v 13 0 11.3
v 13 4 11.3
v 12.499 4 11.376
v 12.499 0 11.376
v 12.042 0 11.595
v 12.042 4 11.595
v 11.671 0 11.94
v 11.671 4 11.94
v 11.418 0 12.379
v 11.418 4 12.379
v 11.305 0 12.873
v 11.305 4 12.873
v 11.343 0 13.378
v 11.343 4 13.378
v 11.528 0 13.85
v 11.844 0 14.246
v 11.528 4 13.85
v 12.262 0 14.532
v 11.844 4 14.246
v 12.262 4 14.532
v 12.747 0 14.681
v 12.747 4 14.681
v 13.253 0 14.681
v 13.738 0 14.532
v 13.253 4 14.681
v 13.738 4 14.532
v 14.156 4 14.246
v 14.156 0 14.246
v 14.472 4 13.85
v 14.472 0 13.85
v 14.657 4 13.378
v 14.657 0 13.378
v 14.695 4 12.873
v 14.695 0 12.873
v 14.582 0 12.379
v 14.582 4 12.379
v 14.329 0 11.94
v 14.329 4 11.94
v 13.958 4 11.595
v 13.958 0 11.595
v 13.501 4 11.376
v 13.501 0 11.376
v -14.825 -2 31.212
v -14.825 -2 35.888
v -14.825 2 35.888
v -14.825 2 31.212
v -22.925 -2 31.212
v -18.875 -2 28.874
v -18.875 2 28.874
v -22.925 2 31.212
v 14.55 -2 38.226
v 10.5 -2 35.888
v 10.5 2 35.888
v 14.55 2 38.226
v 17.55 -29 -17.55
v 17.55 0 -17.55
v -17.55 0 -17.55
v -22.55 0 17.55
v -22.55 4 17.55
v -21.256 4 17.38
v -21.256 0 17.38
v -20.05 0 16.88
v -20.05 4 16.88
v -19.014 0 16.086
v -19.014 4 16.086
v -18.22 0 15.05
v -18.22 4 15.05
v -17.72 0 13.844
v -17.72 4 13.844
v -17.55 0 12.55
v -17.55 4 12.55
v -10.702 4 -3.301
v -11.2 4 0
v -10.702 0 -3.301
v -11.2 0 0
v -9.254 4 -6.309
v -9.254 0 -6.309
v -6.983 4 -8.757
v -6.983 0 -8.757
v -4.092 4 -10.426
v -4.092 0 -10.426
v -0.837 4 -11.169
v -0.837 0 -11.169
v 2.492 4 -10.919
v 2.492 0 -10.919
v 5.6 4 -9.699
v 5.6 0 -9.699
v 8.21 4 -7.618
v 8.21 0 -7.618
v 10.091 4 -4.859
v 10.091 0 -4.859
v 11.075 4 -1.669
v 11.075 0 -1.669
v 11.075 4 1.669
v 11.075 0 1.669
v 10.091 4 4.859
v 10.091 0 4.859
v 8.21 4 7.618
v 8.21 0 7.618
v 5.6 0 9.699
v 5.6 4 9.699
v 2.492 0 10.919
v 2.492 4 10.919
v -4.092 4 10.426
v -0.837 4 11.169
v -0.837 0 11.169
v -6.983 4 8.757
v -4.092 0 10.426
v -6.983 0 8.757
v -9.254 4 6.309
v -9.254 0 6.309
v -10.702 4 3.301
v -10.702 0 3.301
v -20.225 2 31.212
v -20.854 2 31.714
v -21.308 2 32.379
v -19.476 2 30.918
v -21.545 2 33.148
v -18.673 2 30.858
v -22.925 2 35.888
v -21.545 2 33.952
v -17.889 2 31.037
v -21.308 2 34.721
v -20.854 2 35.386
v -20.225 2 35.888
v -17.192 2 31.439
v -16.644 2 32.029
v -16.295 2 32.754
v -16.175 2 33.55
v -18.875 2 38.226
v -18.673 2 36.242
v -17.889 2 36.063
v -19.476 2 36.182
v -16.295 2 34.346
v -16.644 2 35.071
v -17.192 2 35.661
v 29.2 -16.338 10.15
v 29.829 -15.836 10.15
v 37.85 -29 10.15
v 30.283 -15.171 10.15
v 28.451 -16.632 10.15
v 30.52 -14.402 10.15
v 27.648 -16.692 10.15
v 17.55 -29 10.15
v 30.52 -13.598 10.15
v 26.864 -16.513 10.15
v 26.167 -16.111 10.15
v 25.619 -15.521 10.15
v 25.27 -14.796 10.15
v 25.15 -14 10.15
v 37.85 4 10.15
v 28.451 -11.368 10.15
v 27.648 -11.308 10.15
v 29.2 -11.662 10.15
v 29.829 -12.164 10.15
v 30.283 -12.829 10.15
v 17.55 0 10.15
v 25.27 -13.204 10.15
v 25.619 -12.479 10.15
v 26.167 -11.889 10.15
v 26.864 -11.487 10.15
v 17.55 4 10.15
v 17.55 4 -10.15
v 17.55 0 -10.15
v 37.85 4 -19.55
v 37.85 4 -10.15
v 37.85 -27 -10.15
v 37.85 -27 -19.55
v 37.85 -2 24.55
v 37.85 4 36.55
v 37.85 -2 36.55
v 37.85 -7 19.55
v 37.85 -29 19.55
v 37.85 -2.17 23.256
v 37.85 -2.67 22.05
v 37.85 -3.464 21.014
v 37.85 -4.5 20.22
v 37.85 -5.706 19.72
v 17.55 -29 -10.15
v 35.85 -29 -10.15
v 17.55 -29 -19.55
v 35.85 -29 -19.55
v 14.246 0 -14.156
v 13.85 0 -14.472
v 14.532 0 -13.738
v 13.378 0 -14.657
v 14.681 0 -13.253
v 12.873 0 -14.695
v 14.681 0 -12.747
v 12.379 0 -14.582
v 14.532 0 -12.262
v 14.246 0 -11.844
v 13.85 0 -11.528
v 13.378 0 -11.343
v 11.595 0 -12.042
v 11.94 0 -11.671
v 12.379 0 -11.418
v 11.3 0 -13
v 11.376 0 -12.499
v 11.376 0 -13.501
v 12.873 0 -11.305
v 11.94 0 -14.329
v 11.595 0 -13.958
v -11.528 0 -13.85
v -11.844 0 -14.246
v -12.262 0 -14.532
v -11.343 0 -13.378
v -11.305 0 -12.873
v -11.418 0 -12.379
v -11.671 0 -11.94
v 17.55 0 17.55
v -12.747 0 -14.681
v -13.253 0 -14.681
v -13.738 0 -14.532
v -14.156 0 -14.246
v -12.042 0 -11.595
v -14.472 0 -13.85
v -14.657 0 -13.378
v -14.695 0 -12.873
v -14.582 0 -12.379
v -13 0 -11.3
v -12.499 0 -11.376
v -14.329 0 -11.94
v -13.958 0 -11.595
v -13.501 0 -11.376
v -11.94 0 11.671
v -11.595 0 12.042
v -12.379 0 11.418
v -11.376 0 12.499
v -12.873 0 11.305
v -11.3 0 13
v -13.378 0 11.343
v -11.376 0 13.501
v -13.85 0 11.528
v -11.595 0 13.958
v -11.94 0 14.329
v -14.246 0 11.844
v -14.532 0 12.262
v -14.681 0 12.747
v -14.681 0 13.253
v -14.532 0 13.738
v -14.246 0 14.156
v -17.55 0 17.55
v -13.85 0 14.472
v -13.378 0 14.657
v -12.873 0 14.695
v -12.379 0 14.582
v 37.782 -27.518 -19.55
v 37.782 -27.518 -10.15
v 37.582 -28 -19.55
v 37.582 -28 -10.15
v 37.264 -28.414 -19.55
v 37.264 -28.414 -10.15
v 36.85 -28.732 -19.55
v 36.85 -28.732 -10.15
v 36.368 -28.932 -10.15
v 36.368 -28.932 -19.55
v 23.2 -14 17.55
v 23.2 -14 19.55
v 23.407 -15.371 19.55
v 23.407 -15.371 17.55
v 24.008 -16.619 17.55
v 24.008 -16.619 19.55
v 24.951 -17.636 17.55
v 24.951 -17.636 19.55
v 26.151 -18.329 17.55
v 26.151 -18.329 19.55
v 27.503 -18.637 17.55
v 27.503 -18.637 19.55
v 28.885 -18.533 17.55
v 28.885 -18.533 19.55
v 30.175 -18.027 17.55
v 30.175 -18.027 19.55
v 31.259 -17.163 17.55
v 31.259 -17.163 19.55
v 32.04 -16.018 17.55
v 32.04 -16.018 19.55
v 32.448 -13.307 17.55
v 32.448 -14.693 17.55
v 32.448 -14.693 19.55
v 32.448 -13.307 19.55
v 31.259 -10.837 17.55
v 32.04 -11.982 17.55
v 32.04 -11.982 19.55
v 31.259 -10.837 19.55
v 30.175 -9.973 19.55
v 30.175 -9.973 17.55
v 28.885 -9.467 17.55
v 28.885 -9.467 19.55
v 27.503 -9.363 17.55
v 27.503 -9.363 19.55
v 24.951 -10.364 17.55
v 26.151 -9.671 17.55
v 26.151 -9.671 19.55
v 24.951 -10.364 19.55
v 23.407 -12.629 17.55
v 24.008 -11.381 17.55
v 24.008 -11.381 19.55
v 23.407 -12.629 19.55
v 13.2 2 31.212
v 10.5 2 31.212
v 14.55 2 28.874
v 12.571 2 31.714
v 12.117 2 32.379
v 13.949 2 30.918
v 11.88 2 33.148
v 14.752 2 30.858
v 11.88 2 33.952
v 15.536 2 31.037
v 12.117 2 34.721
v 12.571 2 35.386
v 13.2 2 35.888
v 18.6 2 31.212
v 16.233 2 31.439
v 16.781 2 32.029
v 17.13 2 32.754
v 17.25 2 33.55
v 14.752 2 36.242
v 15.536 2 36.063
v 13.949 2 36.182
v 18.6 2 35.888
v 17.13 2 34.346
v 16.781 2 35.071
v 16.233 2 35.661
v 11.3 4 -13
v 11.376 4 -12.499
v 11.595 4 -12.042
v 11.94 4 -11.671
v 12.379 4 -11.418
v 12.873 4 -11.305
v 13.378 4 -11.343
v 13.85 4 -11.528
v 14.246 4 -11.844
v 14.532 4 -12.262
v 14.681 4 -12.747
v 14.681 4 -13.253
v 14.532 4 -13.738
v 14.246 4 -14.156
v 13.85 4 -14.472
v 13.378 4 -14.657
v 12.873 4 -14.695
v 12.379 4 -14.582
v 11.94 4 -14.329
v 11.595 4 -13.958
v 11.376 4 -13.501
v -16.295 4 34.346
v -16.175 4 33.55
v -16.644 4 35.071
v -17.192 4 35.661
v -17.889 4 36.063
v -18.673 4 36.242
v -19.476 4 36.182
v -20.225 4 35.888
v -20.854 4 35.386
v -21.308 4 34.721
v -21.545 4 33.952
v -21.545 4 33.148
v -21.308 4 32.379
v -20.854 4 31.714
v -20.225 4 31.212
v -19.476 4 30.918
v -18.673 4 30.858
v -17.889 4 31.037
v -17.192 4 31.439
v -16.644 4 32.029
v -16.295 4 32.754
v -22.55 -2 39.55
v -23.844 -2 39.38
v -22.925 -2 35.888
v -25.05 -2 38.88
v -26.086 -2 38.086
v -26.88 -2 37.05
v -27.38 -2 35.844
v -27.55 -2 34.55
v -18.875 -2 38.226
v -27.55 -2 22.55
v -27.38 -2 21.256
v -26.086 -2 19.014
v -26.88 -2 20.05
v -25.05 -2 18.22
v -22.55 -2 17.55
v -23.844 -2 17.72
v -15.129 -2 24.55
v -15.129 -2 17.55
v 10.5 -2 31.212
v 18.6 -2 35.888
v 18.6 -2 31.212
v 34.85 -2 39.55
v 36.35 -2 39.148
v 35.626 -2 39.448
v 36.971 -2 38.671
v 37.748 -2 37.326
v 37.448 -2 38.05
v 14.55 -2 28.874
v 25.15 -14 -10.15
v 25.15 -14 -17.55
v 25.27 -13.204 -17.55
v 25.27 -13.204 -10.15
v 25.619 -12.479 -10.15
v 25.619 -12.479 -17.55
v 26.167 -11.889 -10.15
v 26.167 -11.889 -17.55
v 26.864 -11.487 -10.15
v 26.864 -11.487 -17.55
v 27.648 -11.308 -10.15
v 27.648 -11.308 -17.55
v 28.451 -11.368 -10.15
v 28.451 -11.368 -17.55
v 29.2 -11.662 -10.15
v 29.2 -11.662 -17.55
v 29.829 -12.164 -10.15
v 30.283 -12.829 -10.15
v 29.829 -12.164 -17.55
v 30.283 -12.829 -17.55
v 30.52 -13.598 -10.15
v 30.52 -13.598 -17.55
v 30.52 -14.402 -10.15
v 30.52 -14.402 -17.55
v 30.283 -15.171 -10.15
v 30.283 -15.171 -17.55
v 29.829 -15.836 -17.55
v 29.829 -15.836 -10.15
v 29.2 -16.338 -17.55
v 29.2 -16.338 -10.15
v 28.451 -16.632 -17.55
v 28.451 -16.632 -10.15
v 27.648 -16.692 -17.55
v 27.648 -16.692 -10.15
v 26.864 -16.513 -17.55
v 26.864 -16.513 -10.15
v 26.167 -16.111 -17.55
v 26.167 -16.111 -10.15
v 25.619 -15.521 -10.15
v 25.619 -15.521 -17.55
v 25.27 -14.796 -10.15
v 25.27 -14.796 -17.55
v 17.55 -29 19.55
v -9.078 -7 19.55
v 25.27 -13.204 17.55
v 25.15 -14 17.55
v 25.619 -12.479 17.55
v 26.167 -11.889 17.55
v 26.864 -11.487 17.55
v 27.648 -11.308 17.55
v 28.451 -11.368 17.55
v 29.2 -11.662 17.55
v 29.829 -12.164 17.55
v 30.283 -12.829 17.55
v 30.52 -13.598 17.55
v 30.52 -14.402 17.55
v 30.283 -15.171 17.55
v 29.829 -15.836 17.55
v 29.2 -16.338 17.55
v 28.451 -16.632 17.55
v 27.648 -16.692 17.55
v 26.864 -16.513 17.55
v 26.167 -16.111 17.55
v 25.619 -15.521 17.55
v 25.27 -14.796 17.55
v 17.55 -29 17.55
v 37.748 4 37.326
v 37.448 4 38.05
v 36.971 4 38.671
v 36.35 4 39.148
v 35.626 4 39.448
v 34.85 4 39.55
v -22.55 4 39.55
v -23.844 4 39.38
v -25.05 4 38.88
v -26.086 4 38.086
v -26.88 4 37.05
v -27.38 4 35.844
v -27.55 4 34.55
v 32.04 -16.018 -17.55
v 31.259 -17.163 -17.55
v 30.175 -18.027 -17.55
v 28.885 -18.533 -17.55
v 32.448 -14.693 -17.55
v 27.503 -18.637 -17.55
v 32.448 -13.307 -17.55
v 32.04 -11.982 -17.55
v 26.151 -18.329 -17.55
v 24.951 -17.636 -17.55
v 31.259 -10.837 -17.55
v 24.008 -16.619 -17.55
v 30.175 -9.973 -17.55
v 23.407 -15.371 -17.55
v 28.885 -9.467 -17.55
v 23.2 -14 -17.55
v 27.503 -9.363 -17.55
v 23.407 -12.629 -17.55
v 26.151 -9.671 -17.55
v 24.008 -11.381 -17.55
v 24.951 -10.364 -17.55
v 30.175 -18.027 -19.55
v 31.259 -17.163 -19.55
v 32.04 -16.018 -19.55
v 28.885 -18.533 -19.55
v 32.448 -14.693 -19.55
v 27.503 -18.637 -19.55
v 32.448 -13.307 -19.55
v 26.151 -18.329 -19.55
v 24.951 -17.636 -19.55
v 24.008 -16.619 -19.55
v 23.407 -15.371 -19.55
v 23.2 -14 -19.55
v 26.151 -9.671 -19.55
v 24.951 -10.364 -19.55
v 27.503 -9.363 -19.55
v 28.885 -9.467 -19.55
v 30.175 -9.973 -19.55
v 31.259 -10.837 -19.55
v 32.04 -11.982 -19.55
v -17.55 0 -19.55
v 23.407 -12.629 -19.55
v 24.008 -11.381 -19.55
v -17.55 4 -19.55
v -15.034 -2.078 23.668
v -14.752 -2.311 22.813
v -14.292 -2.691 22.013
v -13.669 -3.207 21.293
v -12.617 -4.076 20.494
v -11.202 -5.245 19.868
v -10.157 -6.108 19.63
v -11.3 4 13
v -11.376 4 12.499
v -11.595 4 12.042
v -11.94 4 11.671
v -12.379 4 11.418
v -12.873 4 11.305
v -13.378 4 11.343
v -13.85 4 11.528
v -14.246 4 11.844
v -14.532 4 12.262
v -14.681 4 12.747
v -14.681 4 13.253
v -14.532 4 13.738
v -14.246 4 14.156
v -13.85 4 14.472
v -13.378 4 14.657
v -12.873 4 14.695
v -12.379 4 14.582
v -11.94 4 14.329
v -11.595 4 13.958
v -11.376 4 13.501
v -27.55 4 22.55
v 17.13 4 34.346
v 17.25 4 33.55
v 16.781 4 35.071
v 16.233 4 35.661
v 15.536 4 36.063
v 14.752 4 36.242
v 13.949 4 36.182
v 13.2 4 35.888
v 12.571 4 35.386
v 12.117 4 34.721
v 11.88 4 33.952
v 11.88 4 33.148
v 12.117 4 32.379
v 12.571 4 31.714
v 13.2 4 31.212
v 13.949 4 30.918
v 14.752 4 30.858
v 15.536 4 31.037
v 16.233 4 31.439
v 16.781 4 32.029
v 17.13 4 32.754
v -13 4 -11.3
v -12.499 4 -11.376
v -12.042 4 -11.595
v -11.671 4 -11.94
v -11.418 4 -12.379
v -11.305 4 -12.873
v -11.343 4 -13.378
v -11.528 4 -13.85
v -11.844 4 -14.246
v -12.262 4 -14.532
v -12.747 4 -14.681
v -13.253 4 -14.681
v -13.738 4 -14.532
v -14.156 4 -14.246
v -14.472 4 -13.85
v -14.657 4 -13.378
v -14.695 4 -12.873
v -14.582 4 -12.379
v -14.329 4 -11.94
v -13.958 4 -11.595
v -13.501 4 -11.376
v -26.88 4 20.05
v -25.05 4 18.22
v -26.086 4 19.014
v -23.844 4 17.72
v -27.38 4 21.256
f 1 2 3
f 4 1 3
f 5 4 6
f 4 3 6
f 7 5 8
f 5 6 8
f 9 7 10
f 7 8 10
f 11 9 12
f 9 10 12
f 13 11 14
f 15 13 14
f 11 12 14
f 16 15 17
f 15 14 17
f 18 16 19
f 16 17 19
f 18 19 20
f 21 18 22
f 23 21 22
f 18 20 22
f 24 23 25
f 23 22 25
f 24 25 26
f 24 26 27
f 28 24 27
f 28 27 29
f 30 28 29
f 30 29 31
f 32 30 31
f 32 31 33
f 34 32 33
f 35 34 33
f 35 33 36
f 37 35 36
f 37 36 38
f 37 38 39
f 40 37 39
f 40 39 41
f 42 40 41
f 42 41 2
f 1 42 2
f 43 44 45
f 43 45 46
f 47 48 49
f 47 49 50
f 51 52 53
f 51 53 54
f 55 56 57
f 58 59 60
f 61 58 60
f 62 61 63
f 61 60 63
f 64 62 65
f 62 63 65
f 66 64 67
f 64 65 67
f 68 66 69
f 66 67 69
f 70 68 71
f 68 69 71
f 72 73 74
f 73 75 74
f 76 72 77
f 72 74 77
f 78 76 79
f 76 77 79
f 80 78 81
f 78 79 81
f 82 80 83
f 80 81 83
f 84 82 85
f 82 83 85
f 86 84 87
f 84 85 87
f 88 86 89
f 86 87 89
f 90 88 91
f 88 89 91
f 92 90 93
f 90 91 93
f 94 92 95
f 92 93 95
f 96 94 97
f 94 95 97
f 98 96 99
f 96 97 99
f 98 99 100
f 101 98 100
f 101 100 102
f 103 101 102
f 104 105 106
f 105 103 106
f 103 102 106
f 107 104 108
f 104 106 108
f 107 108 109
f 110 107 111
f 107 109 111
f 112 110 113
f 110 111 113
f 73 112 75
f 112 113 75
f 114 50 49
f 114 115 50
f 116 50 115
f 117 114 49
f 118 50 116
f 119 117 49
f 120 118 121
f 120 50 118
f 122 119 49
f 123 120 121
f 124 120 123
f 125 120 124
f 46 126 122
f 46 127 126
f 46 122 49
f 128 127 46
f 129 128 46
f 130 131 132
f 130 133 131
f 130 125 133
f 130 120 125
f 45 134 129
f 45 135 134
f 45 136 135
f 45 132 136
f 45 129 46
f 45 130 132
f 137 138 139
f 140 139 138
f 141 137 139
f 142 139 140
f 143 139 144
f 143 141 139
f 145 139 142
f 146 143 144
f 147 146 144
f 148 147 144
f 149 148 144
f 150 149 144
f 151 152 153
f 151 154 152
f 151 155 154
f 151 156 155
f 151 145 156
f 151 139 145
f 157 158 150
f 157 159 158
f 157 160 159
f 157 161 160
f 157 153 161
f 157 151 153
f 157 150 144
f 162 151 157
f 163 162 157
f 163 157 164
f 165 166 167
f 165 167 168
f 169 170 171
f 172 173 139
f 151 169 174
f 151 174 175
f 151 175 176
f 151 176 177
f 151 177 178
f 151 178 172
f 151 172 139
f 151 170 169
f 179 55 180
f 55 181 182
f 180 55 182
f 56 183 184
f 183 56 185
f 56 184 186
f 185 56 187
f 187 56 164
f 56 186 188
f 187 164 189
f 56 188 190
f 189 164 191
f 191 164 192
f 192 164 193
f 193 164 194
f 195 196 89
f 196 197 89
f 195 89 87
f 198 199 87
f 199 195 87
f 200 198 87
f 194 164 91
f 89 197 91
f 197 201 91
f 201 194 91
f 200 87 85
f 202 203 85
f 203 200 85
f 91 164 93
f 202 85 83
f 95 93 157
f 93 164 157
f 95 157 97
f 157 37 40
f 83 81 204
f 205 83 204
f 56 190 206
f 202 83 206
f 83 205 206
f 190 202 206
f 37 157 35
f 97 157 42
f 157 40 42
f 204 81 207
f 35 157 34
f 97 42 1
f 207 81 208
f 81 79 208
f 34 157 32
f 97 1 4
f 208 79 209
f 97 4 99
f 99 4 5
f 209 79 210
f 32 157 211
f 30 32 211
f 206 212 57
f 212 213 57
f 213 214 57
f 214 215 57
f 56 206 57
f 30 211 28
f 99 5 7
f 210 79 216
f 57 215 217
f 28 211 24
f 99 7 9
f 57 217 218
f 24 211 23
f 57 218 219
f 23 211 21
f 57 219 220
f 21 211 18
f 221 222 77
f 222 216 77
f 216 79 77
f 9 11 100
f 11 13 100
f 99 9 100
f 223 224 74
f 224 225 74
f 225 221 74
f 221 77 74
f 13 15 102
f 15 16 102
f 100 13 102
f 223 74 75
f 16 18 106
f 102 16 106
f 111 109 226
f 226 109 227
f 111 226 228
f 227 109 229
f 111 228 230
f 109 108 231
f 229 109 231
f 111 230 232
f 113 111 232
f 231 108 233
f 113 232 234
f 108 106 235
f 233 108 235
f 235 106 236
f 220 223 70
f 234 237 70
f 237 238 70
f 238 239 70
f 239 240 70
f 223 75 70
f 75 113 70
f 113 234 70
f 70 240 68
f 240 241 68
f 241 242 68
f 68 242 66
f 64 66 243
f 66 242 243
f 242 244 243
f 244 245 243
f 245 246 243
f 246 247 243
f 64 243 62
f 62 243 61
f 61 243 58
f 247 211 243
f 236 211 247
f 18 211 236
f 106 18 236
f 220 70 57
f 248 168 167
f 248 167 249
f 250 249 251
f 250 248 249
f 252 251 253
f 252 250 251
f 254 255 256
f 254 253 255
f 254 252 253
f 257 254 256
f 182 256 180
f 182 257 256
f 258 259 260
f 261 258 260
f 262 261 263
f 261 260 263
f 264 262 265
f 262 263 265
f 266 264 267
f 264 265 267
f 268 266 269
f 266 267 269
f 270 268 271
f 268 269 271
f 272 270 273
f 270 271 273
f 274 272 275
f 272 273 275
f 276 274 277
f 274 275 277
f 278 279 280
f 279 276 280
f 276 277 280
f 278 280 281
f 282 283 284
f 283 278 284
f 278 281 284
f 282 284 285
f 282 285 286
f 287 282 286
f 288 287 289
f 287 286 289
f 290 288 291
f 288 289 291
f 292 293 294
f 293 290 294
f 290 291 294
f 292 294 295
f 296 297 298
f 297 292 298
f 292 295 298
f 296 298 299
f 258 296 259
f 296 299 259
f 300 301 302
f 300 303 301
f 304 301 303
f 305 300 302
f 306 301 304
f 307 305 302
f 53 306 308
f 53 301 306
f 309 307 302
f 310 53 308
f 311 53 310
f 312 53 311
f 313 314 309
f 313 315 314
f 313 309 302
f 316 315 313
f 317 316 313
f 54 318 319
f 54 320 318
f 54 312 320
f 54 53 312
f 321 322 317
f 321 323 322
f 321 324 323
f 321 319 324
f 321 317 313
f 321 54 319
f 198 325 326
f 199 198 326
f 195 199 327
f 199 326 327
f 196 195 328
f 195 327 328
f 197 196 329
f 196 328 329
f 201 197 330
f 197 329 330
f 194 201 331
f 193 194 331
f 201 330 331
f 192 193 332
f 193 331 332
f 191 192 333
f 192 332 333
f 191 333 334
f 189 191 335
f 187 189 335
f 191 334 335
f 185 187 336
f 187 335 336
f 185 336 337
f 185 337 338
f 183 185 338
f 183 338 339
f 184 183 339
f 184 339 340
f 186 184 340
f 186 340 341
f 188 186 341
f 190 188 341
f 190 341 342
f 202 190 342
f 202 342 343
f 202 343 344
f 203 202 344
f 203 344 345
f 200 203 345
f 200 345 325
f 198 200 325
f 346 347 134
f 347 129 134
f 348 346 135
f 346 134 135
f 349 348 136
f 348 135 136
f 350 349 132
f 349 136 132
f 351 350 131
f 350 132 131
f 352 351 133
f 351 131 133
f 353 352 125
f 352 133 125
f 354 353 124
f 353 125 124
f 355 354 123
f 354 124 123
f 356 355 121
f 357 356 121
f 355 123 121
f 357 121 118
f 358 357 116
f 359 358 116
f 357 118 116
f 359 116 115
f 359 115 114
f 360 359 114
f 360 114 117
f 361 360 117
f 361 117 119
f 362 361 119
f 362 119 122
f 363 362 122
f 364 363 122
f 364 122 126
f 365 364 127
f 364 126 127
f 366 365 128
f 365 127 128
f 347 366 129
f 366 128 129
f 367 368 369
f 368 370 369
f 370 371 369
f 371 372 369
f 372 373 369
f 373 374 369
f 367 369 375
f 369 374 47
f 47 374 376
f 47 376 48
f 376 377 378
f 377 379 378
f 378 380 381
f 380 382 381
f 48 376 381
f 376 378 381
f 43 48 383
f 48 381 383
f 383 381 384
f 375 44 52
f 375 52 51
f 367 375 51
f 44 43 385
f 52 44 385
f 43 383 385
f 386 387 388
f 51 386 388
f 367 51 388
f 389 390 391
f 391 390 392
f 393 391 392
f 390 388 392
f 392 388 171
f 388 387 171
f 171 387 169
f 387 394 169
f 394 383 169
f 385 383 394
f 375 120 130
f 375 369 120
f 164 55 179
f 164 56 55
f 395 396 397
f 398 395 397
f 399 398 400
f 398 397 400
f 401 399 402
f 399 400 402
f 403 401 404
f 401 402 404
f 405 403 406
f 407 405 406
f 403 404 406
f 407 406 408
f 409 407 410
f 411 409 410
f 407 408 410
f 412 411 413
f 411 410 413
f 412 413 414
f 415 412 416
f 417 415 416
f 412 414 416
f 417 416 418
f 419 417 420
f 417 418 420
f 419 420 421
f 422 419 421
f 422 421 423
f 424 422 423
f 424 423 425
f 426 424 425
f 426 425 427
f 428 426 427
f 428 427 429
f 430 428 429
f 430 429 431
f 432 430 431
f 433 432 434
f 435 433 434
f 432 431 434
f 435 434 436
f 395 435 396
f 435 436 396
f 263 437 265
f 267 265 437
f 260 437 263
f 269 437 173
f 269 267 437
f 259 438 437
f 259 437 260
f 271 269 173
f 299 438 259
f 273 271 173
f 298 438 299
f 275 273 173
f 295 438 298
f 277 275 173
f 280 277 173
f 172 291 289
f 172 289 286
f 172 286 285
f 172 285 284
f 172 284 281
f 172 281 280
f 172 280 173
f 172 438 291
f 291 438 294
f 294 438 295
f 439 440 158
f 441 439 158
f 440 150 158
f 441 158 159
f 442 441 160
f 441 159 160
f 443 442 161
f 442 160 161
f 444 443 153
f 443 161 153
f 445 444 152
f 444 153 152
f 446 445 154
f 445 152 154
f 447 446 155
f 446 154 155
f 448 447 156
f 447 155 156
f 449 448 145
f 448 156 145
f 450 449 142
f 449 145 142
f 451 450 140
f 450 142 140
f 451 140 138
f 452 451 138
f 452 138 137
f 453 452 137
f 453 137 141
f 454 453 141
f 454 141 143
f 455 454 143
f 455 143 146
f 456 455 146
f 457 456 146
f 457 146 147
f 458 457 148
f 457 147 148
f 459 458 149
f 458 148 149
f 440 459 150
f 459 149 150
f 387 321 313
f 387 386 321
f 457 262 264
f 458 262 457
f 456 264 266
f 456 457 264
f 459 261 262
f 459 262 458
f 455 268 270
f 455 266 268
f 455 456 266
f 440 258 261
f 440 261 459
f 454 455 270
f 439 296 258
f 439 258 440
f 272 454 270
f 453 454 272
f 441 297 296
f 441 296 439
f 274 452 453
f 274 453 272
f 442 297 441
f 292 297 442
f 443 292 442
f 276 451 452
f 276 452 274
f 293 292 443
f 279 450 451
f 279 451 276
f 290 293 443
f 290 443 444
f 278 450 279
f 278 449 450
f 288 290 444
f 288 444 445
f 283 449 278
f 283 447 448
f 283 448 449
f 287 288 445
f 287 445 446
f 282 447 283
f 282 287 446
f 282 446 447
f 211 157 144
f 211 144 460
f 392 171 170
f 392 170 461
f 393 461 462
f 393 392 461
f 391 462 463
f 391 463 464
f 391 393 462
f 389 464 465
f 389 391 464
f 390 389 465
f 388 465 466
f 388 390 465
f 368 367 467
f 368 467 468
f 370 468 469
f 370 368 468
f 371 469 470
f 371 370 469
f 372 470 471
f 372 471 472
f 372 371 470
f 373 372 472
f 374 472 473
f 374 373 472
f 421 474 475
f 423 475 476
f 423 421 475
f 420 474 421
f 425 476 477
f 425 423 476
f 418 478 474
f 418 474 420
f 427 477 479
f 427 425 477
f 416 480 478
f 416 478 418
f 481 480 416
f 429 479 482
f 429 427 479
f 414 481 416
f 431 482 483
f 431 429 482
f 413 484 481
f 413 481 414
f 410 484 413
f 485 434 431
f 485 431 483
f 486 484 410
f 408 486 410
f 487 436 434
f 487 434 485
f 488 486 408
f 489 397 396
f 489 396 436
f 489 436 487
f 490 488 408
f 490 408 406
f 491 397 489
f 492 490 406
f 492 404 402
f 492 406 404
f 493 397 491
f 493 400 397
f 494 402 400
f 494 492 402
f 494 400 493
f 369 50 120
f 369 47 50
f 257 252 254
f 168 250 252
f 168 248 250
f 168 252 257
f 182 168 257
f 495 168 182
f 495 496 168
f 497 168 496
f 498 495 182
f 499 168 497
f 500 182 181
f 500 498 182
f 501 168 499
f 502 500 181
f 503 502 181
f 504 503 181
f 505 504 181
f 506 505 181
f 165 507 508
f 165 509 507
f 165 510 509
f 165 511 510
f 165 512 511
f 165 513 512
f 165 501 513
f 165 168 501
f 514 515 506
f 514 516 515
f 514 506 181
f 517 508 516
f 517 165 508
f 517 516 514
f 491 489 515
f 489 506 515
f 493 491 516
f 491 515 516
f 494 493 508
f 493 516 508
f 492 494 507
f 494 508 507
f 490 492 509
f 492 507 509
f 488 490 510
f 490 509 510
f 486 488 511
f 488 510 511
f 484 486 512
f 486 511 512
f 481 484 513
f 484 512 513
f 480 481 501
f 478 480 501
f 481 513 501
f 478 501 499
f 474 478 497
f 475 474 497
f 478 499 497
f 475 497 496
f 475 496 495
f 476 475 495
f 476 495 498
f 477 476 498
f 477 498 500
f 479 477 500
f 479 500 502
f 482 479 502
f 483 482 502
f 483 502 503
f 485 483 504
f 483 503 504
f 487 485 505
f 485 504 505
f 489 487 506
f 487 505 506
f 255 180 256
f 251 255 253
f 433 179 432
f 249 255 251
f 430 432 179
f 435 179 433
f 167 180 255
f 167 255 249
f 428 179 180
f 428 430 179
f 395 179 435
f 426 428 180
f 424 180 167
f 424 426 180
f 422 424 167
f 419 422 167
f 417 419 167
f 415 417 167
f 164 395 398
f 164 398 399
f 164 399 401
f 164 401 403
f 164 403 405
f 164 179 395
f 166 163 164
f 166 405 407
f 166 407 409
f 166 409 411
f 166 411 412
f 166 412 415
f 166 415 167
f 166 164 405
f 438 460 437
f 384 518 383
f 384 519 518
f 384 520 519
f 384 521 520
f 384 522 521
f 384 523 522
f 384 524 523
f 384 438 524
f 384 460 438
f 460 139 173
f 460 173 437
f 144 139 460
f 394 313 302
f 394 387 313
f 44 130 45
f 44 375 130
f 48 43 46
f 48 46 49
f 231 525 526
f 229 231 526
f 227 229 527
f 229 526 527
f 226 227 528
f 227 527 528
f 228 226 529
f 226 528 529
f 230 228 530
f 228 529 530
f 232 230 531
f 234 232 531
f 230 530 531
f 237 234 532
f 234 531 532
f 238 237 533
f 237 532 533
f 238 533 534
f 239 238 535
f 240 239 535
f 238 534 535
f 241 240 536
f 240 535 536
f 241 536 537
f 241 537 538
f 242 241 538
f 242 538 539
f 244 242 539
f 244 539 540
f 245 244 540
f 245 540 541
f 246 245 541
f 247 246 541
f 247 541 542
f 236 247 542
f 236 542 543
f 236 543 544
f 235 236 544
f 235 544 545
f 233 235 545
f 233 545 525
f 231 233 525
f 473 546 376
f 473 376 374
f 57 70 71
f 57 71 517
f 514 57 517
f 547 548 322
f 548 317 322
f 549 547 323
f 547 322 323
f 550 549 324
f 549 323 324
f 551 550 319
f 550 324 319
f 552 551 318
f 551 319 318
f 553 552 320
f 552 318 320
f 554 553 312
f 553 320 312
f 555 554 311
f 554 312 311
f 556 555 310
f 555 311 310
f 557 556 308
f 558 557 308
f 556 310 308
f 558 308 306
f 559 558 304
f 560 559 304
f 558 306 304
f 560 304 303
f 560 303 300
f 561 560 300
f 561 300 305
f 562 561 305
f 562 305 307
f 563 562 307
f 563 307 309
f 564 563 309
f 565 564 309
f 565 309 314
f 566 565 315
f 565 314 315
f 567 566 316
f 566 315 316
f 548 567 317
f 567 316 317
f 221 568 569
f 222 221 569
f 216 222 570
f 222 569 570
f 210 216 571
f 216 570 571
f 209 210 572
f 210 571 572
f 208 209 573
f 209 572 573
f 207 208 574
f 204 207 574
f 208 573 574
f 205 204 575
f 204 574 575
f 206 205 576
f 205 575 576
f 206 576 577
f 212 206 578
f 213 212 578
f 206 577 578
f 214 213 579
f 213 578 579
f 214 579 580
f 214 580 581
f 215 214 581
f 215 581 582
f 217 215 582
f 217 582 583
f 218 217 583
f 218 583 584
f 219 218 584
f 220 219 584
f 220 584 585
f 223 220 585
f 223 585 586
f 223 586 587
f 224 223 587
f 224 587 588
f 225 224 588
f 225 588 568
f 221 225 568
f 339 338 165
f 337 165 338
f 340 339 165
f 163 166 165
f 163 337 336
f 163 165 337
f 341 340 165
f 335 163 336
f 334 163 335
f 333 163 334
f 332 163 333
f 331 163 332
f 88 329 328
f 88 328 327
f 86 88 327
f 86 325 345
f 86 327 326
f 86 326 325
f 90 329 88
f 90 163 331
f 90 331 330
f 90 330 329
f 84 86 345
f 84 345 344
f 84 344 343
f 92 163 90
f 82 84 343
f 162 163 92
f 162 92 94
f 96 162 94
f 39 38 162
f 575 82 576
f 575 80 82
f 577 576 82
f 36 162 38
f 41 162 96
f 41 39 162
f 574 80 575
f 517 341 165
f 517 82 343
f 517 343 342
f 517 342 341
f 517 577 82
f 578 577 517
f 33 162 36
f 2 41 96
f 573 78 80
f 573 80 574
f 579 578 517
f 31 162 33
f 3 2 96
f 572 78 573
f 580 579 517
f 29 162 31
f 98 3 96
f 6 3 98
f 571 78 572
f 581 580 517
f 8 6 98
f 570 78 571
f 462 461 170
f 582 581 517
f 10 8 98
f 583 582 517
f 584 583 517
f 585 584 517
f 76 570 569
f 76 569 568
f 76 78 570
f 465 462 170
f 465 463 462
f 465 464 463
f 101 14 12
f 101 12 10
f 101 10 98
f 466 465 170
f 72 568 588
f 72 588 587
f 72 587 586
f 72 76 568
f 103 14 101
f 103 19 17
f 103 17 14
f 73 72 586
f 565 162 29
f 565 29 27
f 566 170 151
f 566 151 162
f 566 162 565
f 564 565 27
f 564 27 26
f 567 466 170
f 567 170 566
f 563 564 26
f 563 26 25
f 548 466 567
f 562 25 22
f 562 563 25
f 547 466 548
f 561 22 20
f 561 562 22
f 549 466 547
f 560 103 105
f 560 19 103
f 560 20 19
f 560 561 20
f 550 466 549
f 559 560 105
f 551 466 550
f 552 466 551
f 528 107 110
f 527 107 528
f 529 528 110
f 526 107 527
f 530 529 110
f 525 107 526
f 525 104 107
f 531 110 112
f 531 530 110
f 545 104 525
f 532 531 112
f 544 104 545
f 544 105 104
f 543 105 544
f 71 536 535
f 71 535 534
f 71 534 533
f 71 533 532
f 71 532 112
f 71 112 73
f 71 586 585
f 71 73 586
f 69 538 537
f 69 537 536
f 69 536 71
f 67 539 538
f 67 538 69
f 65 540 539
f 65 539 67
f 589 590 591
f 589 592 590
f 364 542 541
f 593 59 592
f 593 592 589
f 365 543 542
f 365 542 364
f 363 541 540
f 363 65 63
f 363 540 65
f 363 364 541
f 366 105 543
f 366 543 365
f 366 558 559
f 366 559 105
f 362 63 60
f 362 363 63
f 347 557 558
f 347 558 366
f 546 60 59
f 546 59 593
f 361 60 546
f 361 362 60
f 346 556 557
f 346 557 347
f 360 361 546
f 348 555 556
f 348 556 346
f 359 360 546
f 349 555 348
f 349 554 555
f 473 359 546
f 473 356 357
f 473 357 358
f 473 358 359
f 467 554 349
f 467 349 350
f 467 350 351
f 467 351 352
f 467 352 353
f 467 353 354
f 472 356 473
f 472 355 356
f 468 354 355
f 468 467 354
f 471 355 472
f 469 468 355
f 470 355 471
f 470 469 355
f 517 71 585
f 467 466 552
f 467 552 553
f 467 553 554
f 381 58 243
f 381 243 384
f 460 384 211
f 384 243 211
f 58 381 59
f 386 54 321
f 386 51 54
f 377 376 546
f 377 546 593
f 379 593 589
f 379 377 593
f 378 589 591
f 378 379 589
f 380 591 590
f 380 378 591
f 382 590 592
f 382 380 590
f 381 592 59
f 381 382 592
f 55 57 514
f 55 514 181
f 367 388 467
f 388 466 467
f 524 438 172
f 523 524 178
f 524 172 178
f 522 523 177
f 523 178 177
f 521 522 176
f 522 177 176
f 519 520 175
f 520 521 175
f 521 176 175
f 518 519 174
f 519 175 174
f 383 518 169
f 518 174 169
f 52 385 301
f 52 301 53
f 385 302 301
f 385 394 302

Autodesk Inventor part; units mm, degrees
ref_plane "YZ Plane" through (0, 0, 0) normal (1, 0, 0) x (0, 1, 0)
ref_plane "XZ Plane" through (0, 0, 0) normal (0, 1, 0) x (-1, 0, 0)
ref_plane "XY Plane" through (0, 0, 0) normal (0, 0, 1) x (1, 0, 0)
sketch "Boceto1" plane through (0, 0, 0) normal (0, 1, 0) x (-1, 0, 0)
  line L0 (-17.55, 17.55) -> (17.55, 17.55)
  line L1 (17.55, 17.55) -> (17.55, -17.55)
  line L2 (17.55, -17.55) -> (-17.55, -17.55)
  line L3 (-17.55, -17.55) -> (-17.55, 17.55)
  line L4 (-17.55, 17.55) -> (17.55, -17.55) construction
  line L5 (17.55, 17.55) -> (-17.55, -17.55) construction
  circle A0 centre (0, 0) radius 11.2
  point P0 (0, 0)
  dimension "d0" = 35.1
  dimension "d1" = 35.1
  dimension "d2" = 22.4
extrude "Extrusión1" add sketch "Boceto1" along normal blind 4
sketch "Boceto2" plane through (0, 4, 0) normal (0, 1, 0) x (1, 0, 0)
  circle A0 centre (-13, -13) radius 1.7
  line L0 (13, -13) -> (-13, -13)
  line L1 (-13, -13) -> (-13, 13)
  line L2 (-13, 13) -> (13, 13)
  line L3 (13, 13) -> (13, -13)
  line L4 (13, -13) -> (-13, 13) construction
  line L5 (-13, -13) -> (13, 13) construction
  point P0 (0, 0)
  dimension "d5" = 26
  dimension "d6" = 26
  dimension "d7" = 3.4
extrude "Extrusión2" cut sketch "Boceto2" against normal through all contours L0 L1 A0 | A0 L1 L0
pattern_circular "Patrón circular1" count 4 over 360 about axis through (0, 0, 0) along (0, 1, 0) of "Extrusión2"
sketch "Boceto13" plane through (0, 4, 0) normal (0, 1, 0) x (1, 0, 0)
  line L0 (-17.55, -17.55) -> (17.55, -17.55) projected
  line L1 (17.55, -17.55) -> (37.85, -17.55)
  line L2 (37.85, -17.55) -> (37.85, 17.55)
  line L3 (37.85, 17.55) -> (17.55, 17.55)
  line L4 (17.55, 17.55) -> (17.55, -17.55)
  line L5 (17.55, 17.55) -> (-17.55, 17.55) projected
  line L6 (41.5, -10.15) -> (21.2, -10.15)
  line L7 (21.2, -10.15) -> (21.2, 10.15)
  line L8 (21.2, 10.15) -> (41.5, 10.15)
  line L9 (41.5, 10.15) -> (41.5, -10.15)
  line L10 (41.5, -10.15) -> (21.2, 10.15) construction
  line L11 (21.2, -10.15) -> (41.5, 10.15) construction
  circle A0 centre (27.85, 0) radius 2.7
  point P0 (0, 0)
  point P1 (31.35, 0)
  dimension "d43" = 20.3
  dimension "d44" = 20.3
  dimension "d45" = 20.3
  dimension "d61" = 5.4
  dimension "d62" = 10
extrude "Extrusión8" add sketch "Boceto13" against normal blind 33 contours L4 L3 L2 L8 L7 L6 L1 | L6 L7 L8 L2
sketch "Boceto14" plane through (0, -29, 0) normal (0, -1, 0) x (1, 0, 0)
  line L0 (17.55, 17.55) -> (17.55, -17.55) projected
  line L1 (37.85, -10.15) -> (17.55, -10.15)
  line L2 (17.55, -10.15) -> (17.55, 10.15)
  line L3 (17.55, 10.15) -> (37.85, 10.15)
  line L4 (37.85, 10.15) -> (37.85, -10.15)
  line L5 (37.85, -10.15) -> (17.55, 10.15) construction
  line L6 (17.55, -10.15) -> (37.85, 10.15) construction
  line L7 (37.85, -17.55) -> (37.85, 17.55) projected
  circle A0 centre (27.85, 0) radius 2.7 projected
  point P0 (0, 0)
  point P1 (27.7, 0)
  point P2 (17.55, -10.15)
  point P3 (27.7, 0)
  dimension "d49" = 20.3
extrude "Extrusión9" cut sketch "Boceto14" against normal up to surface (29 mm away) contours L3 L4 L1 L0 | A0
sketch "Boceto15" plane through (-17.55, 0, -17.55) normal (0, 0, -1) x (-1, 0, 0)
  line L0 (-35.1, 0) -> (0, 0) projected
  line L1 (0, 0) -> (0, 4) projected
  line L2 (-55.4, 4) -> (0, 4) projected
  line L3 (-55.4, 4) -> (-55.4, -29) projected
  line L4 (-35.1, -29) -> (-55.4, -29) projected
  line L5 (-35.1, 0) -> (-35.1, -29) projected
  line L6 (0, 0) -> (0, 4) projected
  line L7 (-35.1, -29) -> (-55.4, -29) projected
  line L8 (0, 0) -> (-35.1, -29)
  point P0 (-17.55, 0)
extrude "Extrusión10" add sketch "Boceto15" along normal blind 2
mirror "Simetría1" about plane through (0, 0, 0) normal (0, 0, 1) of "Extrusión10"
sketch "Boceto16" plane through (-17.55, 0, -19.55) normal (0, 0, -1) x (-1, 0, 0)
  circle A0 centre (-45.4, -14) radius 2.7
  line L0 (-55.4, 4) -> (-55.4, -29) projected
  line L1 (-55.4, -29) -> (-35.1, -29) projected
  point P0 (-17.55, 0)
  dimension "d54" = 10
  dimension "d55" = 5.4
  dimension "d57" = 15
extrude "Extrusión11" cut sketch "Boceto16" against normal through all
fillet "Empalme1" radius 2 1 edges at (37.85, -29, -14.85)
sketch "Boceto17" plane through (-17.55, 0, -19.55) normal (0, 0, -1) x (-1, 0, 0)
  circle A0 centre (-45.4, -14) radius 2.7 projected
  circle A1 centre (-45.4, -14) radius 4.65
  point P0 (-17.55, 0)
  dimension "d63" = 9.3
extrude "Extrusión12" cut sketch "Boceto17" against normal blind 2 contours A0 | A1
sketch "Boceto18" plane through (0, 4, 0) normal (0, 1, 0) x (1, 0, 0)
  circle A0 centre (27.85, 0) radius 2.7 projected
  circle A1 centre (27.85, 0) radius 4.6
  point P0 (0, 0)
  dimension "d66" = 9.2
extrude "Extrusión13" cut sketch "Boceto18" against normal blind 2 contours A0 | A1
mirror "Simetría2" about plane through (0, 0, 0) normal (0, 0, 1) of "Extrusión12"
sketch "Boceto19" plane through (0, 4, 0) normal (0, 1, 0) x (1, 0, 0)
  line L0 (17.55, -17.55) -> (-17.55, -17.55) projected
  line L1 (-17.55, 17.55) -> (-17.55, -17.55) projected
  line L2 (-17.55, -17.55) -> (37.85, -17.55)
  line L3 (37.85, -17.55) -> (37.85, -39.55)
  line L4 (37.85, -39.55) -> (-17.55, -39.55)
  line L5 (-17.55, -39.55) -> (-17.55, -17.55)
  line L6 (-17.55, -19.55) -> (37.85, -19.55) projected
  line L7 (37.85, -19.55) -> (37.85, 19.55) projected
  line L8 (-17.55, -17.55) -> (-17.55, -19.55) projected
  line L9 (-17.55, -17.55) -> (-27.55, -17.55)
  line L10 (-27.55, -17.55) -> (-27.55, -39.55)
  line L11 (-27.55, -39.55) -> (-17.55, -39.55)
  line L12 (-17.55, -39.55) -> (-17.55, -17.55)
  point P0 (0, 0)
  dimension "d69" = 20
  dimension "d86" = 10
extrude "Extrusión14" add sketch "Boceto19" against normal blind 6
sketch "Boceto20" plane through (0, -2, 0) normal (0, -1, 0) x (1, 0, 0)
  circle A0 centre (-18.875, 33.55) radius 2.7
  circle A1 centre (14.55, 33.55) radius 2.7
  line L0 (37.85, 19.55) -> (37.85, 39.55) projected
  line L1 (-27.55, 39.55) -> (-27.55, 17.55) projected
  line L2 (37.85, 39.55) -> (-27.55, 39.55) projected
  point P0 (0, 0)
  dimension "d72" = 5.4
  dimension "d74" = 23.3
  dimension "d87" = 8.675
  dimension "d88" = 6
extrude "Extrusión15" cut sketch "Boceto20" against normal through all
sketch "Boceto21" plane through (0, -2, 0) normal (0, -1, 0) x (1, 0, 0)
  circle A0 centre (-18.875, 33.55) radius 2.7 projected
  circle A1 centre (-18.875, 33.55) radius 4.05
  circle A2 centre (14.55, 33.55) radius 2.7 projected
  circle A3 centre (14.55, 33.55) radius 4.05
  line L0 (14.55, 38.2265) -> (18.6, 35.8883)
  line L1 (18.6, 35.8883) -> (18.6, 31.2117)
  line L2 (18.6, 31.2117) -> (14.55, 28.8735)
  line L3 (14.55, 28.8735) -> (10.5, 31.2117)
  line L4 (10.5, 31.2117) -> (10.5, 35.8883)
  line L5 (10.5, 35.8883) -> (14.55, 38.2265)
  line L6 (-18.875, 38.2265) -> (-14.825, 35.8883)
  line L7 (-14.825, 35.8883) -> (-14.825, 31.2117)
  line L8 (-14.825, 31.2117) -> (-18.875, 28.8735)
  line L9 (-18.875, 28.8735) -> (-22.925, 31.2117)
  line L10 (-22.925, 31.2117) -> (-22.925, 35.8883)
  line L11 (-22.925, 35.8883) -> (-18.875, 38.2265)
  point P0 (0, 0)
  dimension "d79" = 8.1
extrude "Extrusión16" cut sketch "Boceto21" against normal blind 4 contours A0 | A1 | L7 L8 A1 | A1 L6 L7 | A1 L11 L6 | L8 L9 A1 | A1 L10 L11 | L9 L10 A1 | A2 | A3 | L1 L2 A3 | A3 L0 L1 | A3 L5 L0 | L2 L3 A3 | A3 L4 L5 | L3 L4 A3
fillet "Empalme2" radius 3 1 edges at (37.85, 1, 39.55)
fillet "Empalme3" radius 5 1 edges at (11.3603, -2, 19.55)
sketch "Boceto22" plane through (0, 4, 0) normal (0, 1, 0) x (1, 0, 0)
  line L0 (37.85, -10.15) -> (37.85, 10.15) projected
  line L1 (35.85, 10.15) -> (17.55, 10.15) projected
  line L2 (37.85, -10.15) -> (17.55, -10.15)
  line L3 (17.55, -10.15) -> (17.55, 10.15)
  line L4 (17.55, 10.15) -> (37.85, 10.15)
  line L5 (37.85, 10.15) -> (37.85, -10.15)
  line L6 (17.55, 10.15) -> (17.55, 17.55) projected
  point P0 (0, 0)
extrude "Extrusión17" cut sketch "Boceto22" against normal through all
fillet "Empalme4" radius 5 3 edges at (-27.55, 1, 39.55) (-27.55, 1, 17.55) (-17.55, 2, 17.55)
sketch "Boceto24" plane through (0, -2, 0) normal (0, -1, 0) x (1, 0, 0)
  point P0 (0, 0)
sketch "Boceto7" plane through (17.55, 0, -17.55) normal (0, 0, -1) x (-1, 0, 0)
  line L0 (35.1, 0) -> (35.1, 4) projected
  line L1 (35.1, 4) -> (-20.3, 4)
  line L2 (-20.3, 4) -> (-20.3, -26)
  line L3 (-20.3, -26) -> (35.1, -26)
  line L4 (35.1, -26) -> (35.1, 4)
  line L5 (0, 0) -> (0, 4) projected
  point P0 (17.55, 0)
  point P1 (35.6, 0)
  dimension "d23" = 20.3
  dimension "d24" = 30
sketch "Boceto8" plane through (0, 3, 0) normal (0, 1, 0) x (1, 0, 0)
  line L0 (17.8, 17.8) -> (-17.8, 17.8) projected
  line L1 (17.8, -17.8) -> (16.8, -17.8)
  line L2 (16.8, -17.8) -> (16.8, 17.8)
  line L3 (16.8, 17.8) -> (17.8, 17.8)
  line L4 (17.8, 17.8) -> (17.8, -17.8)
  point P0 (0, 0)
  dimension "d27" = 1
sketch "Boceto9" plane through (17.8, 0, -21.8) normal (0, 0, -1) x (-1, 0, 0)
  circle A0 centre (-10.3, -4.5) radius 2.7
  circle A1 centre (-10.3, -19.5) radius 2.7
  line L0 (-20.3, 3) -> (-20.3, -27) projected
  line L1 (35.6, 3) -> (-20.3, 3) projected
  line L2 (-20.3, -27) -> (35.6, -27) projected
  point P0 (17.8, 0)
  dimension "d30" = 5.4
  dimension "d31" = 10
  dimension "d32" = 7.5
  dimension "d33" = 7.5
  dimension "d41" = 80
  dimension "d42" = 20.3
sketch "Boceto10" plane through (17.8, 0, -17.8) normal (0, 0, 1) x (1, 0, 0)
  line L0 (20.3, 3) -> (20.3, -27) projected
  line L1 (-1, 3) -> (20.3, 3) projected
  line L2 (20.3, -27) -> (0.3, -27)
  line L3 (0.3, -27) -> (0.3, 3)
  line L4 (0.3, 3) -> (20.3, 3)
  line L5 (20.3, 3) -> (20.3, -27)
  circle A0 centre (10.3, -4.5) radius 2.7 projected
  circle A1 centre (10.3, -19.5) radius 2.7 projected
  line L6 (-1, 0) -> (-35.6, 0) projected
  line L7 (-35.6, -27) -> (-35.6, 0) projected
  line L8 (20.3, -27) -> (-35.6, -27) projected
  line L9 (20.3, 3) -> (20.3, -27) projected
  line L10 (-1, 3) -> (20.3, 3) projected
  line L11 (-1, 3) -> (-1, 0) projected
  point P0 (-17.8, 0)
  dimension "d36" = 20
sketch "Boceto3" plane through (-17.55, 0, 17.55) normal (0, 0, 1) x (1, 0, 0)
  line L0 (0, 0) -> (0, 4) projected
  line L1 (0, 4) -> (55.4, 4)
  line L2 (55.4, 4) -> (55.4, -30)
  line L3 (55.4, -30) -> (0, -30)
  line L4 (0, -30) -> (0, 4)
  line L5 (35.1, 0) -> (35.1, 4) projected
  line L6 (0, 0) -> (35.1, 0) projected
  point P0 (17.55, 0)
  dimension "d13" = 20.3
  dimension "d14" = 30
  dimension "d17" = 5.4
  dimension "d18" = 10
  dimension "d19" = 7.5
  dimension "d20" = 7.5
  dimension "d21" = 20.3
  dimension "d22" = 20.3
properties part number "NEMA14 support"
